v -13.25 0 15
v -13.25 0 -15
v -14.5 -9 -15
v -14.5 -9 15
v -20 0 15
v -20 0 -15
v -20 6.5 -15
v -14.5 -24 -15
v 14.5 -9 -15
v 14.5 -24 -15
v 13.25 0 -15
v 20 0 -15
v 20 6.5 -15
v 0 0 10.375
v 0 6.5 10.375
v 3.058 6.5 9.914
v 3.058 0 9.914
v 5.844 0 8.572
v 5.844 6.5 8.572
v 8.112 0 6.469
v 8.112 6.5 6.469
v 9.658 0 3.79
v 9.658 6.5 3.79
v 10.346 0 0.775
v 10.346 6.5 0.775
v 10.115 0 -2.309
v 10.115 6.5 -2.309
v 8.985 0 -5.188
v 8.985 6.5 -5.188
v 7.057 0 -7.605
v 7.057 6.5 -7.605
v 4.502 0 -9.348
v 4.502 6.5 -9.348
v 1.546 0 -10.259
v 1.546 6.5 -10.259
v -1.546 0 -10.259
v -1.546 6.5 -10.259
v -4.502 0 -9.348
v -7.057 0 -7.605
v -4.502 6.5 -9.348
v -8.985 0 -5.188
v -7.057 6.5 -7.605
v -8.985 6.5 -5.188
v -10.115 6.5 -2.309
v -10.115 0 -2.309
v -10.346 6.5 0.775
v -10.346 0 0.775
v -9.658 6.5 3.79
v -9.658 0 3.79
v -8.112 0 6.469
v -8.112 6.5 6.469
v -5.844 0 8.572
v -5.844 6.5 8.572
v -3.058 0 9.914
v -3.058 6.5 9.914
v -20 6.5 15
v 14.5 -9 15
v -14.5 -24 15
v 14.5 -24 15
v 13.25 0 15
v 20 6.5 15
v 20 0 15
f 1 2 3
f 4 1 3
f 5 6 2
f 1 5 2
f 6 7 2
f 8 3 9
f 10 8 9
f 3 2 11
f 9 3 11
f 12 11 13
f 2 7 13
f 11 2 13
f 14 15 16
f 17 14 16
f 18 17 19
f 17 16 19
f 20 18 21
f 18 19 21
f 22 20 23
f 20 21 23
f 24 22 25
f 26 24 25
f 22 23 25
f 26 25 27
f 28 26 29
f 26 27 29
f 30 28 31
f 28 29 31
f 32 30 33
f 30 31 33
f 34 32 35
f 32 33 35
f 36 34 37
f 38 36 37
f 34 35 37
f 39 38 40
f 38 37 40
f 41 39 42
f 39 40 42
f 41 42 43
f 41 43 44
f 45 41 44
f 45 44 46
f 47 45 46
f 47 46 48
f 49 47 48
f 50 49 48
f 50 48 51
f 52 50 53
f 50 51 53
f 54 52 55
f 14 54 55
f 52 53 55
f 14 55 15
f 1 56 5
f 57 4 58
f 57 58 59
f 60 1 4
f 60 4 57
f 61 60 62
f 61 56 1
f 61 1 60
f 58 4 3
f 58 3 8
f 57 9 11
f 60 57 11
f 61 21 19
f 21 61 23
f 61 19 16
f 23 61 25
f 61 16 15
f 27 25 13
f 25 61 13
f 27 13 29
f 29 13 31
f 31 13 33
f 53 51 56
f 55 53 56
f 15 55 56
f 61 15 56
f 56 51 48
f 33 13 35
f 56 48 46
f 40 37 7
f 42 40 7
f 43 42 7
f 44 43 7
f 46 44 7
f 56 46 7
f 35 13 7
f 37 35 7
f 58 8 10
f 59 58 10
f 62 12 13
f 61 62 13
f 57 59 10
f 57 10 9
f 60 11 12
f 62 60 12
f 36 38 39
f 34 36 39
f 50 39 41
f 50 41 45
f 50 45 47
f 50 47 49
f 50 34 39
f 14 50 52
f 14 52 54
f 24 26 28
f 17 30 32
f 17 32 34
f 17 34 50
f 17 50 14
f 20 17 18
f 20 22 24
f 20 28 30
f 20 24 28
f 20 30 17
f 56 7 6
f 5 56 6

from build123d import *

# Parameters (mm, degrees)
BOSS_EXTRUDE1_DEPTH      = 15
BOSS_EXTRUDE1_DEPTH_BACK = 15
SKETCH2_R                = 10.375
CUT_EXTRUDE1_DEPTH       = 6.5


with BuildPart() as part:
    # Sketch1 → Boss-Extrude1 (new, two sides: drawn at the far end of the back side and taken through both)
    with BuildSketch(Plane.XY.offset(-BOSS_EXTRUDE1_DEPTH_BACK)):
        Polygon((-20, 6.5), (-20, 0), (-13.25, 0), (-14.5, -9), (-14.5, -24), (14.5, -24), (14.5, -9), (13.25, 0), (20, 0), (20, 6.5), align=None)
    extrude(amount=BOSS_EXTRUDE1_DEPTH + BOSS_EXTRUDE1_DEPTH_BACK)

    # Sketch2 → Cut-Extrude1 (cut)
    with BuildSketch(Plane(origin=(0, 6.5, 0), x_dir=(1, 0, 0), z_dir=(0, 1, 0))):
        Circle(SKETCH2_R)
    extrude(amount=-CUT_EXTRUDE1_DEPTH, mode=Mode.SUBTRACT)


solid = part.part
